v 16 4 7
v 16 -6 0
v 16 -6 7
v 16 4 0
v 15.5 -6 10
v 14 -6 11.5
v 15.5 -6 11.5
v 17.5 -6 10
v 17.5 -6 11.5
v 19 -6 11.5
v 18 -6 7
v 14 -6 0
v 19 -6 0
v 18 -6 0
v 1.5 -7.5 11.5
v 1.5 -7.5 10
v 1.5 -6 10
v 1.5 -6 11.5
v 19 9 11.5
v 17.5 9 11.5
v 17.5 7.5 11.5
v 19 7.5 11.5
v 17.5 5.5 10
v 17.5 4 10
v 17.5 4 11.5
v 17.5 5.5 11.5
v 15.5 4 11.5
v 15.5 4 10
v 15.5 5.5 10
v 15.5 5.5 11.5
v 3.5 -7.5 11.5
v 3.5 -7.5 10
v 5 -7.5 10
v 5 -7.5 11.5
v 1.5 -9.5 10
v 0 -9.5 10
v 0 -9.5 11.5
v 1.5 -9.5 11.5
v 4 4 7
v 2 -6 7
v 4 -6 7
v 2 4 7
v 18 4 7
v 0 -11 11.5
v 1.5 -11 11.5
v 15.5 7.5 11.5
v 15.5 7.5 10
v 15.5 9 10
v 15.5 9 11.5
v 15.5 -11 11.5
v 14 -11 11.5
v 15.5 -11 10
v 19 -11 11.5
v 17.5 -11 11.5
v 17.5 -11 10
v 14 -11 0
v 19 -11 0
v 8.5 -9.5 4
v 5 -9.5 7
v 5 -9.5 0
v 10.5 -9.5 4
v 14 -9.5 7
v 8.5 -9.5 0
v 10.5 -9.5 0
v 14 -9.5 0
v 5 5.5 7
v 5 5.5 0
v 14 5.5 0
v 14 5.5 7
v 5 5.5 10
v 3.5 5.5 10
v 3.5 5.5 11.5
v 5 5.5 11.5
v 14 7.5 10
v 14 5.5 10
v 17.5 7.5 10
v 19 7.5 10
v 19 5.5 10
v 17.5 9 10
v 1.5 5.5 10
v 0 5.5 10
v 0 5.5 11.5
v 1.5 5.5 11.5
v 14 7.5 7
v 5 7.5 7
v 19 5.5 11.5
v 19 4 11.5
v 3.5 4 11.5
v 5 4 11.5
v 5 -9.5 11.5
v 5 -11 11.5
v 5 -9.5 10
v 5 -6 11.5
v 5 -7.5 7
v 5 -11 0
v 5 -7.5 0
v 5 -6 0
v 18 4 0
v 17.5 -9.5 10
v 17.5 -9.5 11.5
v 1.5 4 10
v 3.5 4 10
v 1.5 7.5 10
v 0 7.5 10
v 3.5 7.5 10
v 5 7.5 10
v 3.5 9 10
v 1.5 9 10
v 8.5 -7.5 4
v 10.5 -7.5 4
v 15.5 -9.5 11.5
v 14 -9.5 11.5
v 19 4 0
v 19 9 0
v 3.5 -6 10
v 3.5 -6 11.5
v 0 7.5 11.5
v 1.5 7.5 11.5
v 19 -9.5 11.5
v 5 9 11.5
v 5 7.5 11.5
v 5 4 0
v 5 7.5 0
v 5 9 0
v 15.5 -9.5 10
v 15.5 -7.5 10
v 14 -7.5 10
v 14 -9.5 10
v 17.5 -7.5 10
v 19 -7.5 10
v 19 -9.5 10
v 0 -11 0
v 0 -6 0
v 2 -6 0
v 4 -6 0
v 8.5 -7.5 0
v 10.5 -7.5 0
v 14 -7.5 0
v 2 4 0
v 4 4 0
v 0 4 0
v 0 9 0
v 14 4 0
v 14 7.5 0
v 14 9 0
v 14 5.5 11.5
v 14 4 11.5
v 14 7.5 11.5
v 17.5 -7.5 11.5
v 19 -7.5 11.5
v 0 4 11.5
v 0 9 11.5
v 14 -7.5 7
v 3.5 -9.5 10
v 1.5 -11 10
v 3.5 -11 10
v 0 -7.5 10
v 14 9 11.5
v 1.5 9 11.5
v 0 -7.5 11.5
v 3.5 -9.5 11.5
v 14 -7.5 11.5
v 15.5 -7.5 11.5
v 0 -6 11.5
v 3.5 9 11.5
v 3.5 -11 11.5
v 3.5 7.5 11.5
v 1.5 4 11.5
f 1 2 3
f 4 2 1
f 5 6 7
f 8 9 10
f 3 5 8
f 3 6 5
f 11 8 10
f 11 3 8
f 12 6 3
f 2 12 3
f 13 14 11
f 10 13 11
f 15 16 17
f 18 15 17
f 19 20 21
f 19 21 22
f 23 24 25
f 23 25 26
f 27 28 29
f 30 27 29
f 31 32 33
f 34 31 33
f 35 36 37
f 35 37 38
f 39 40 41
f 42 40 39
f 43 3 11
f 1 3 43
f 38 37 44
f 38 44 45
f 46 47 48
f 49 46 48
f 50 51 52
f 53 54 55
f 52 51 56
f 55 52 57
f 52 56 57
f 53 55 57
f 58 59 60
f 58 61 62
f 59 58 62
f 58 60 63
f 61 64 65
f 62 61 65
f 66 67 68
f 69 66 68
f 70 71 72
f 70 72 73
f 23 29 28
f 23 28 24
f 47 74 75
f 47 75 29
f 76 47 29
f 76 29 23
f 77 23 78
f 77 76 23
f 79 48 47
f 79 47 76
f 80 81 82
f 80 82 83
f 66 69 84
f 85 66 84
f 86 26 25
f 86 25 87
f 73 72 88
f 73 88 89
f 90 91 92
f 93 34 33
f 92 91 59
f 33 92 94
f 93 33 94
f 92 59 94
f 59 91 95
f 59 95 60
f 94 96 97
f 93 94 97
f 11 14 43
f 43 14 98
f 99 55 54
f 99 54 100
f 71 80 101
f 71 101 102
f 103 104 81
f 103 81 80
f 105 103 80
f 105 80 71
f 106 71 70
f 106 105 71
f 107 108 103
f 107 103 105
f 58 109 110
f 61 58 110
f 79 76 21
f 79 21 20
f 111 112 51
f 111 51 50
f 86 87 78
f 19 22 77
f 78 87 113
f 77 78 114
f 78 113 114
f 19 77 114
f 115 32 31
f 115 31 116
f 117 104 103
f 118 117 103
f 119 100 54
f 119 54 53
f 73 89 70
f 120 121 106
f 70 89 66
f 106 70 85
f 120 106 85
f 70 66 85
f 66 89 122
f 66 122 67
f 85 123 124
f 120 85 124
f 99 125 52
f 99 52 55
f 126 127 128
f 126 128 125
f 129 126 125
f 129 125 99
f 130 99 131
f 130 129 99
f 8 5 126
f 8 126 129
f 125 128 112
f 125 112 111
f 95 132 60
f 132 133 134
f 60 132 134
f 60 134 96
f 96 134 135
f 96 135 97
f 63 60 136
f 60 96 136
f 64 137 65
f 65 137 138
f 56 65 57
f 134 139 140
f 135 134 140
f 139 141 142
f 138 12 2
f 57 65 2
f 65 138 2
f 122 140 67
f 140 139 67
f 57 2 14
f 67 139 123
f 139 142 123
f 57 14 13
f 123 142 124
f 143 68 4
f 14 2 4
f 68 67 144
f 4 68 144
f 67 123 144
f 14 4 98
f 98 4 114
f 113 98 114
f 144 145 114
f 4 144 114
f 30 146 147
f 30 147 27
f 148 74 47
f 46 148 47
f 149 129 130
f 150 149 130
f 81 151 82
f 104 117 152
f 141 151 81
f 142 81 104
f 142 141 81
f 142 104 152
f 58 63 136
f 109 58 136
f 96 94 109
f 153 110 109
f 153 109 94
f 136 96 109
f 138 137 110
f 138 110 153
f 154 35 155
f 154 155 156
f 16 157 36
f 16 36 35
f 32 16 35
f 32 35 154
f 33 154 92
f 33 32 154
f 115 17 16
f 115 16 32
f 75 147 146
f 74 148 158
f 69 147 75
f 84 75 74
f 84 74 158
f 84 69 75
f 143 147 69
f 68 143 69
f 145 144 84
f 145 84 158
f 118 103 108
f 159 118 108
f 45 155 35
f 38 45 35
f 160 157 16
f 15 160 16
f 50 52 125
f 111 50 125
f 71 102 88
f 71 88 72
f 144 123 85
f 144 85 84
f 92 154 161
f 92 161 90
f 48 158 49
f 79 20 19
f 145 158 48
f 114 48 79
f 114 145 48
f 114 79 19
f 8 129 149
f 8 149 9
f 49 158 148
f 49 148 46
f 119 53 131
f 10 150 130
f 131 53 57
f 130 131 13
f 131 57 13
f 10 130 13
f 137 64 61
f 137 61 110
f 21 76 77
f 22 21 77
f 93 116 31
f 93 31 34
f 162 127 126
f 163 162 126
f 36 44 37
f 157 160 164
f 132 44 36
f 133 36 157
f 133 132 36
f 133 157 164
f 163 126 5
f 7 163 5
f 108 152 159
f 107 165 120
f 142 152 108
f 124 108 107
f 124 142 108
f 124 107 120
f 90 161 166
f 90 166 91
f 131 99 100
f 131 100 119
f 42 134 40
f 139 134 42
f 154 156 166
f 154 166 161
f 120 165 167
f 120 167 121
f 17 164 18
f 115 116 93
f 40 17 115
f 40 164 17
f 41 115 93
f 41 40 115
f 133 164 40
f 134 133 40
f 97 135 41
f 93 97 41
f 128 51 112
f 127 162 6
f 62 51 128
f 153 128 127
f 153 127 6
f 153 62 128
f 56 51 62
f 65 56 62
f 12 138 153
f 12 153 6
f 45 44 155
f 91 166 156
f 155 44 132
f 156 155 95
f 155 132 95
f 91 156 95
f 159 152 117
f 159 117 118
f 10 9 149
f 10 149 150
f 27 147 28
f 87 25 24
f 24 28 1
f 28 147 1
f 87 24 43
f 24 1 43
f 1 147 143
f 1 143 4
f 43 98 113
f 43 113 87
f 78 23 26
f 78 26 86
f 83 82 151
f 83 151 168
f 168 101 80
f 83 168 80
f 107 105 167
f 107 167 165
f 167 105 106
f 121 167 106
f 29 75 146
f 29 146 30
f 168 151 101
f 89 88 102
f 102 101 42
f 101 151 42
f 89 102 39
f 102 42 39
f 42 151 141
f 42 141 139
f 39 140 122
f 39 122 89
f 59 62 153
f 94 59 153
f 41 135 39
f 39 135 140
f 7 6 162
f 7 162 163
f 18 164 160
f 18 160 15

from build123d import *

# Parameters (mm, degrees)
BOX021_W     = 19
BOX021_H     = 2
BOX021_DEPTH = 7
BOX020_W     = 19
BOX020_H     = 2
BOX020_DEPTH = 7
BOX018_W     = 1.5
BOX018_H     = 1.5
BOX018_DEPTH = 11.5
BOX016_W     = 1.5
BOX016_H     = 1.5
BOX016_DEPTH = 11.5
BOX017_W     = 1.5
BOX017_H     = 1.5
BOX017_DEPTH = 11.5
BOX019_W     = 1.5
BOX019_H     = 1.5
BOX019_DEPTH = 11.5
BOX015_W     = 5
BOX015_H     = 5
BOX015_DEPTH = 10
BOX013_W     = 1.5
BOX013_H     = 1.5
BOX013_DEPTH = 11.5
BOX011_W     = 1.5
BOX011_H     = 1.5
BOX011_DEPTH = 11.5
BOX012_W     = 1.5
BOX012_H     = 1.5
BOX012_DEPTH = 11.5
BOX014_W     = 1.5
BOX014_H     = 1.5
BOX014_DEPTH = 11.5
BOX010_W     = 5
BOX010_H     = 5
BOX010_DEPTH = 10
BOX023_W     = 19
BOX023_H     = 2
BOX023_DEPTH = 7
BOX003_W     = 1.5
BOX003_H     = 1.5
BOX003_DEPTH = 11.5
BOX001_W     = 1.5
BOX001_H     = 1.5
BOX001_DEPTH = 11.5
BOX002_W     = 1.5
BOX002_H     = 1.5
BOX002_DEPTH = 11.5
BOX004_W     = 1.5
BOX004_H     = 1.5
BOX004_DEPTH = 11.5
BOX_W        = 5
BOX_H        = 5
BOX_DEPTH    = 10
BOX008_W     = 1.5
BOX008_H     = 1.5
BOX008_DEPTH = 11.5
BOX006_W     = 1.5
BOX006_H     = 1.5
BOX006_DEPTH = 11.5
BOX007_W     = 1.5
BOX007_H     = 1.5
BOX007_DEPTH = 11.5
BOX009_W     = 1.5
BOX009_H     = 1.5
BOX009_DEPTH = 11.5
BOX005_W     = 5
BOX005_H     = 5
BOX005_DEPTH = 10
BOX024_W     = 2
BOX024_H     = 3
BOX024_DEPTH = 4
BOX022_W     = 19
BOX022_H     = 2
BOX022_DEPTH = 7


with BuildPart() as cubo021:
    # Box021 → Box021 (new body)
    with BuildSketch(Plane(origin=(0, 5.5, 0), x_dir=(1, 0, 0), z_dir=(0, 0, 1))):
        with Locations((9.5, 1)):
            Rectangle(BOX021_W, BOX021_H)
    extrude(amount=BOX021_DEPTH)


with BuildPart() as cubo020:
    # Box020 → Box020 (new body)
    with BuildSketch(Plane(origin=(18, -10.5, 0), x_dir=(0, 1, 0), z_dir=(0, 0, 1))):
        with Locations((9.5, 1)):
            Rectangle(BOX020_W, BOX020_H)
    extrude(amount=BOX020_DEPTH)


with BuildPart() as cubo018:
    # Box018 → Box018 (new body)
    with BuildSketch(Plane(origin=(3.5, 3.5, 0), x_dir=(1, 0, 0), z_dir=(0, 0, 1))):
        with Locations((0.75, 0.75)):
            Rectangle(BOX018_W, BOX018_H)
    extrude(amount=BOX018_DEPTH)


with BuildPart() as cubo016:
    # Box016 → Box016 (new body)
    with BuildSketch(Plane(origin=(0, 3.5, 0), x_dir=(1, 0, 0), z_dir=(0, 0, 1))):
        with Locations((0.75, 0.75)):
            Rectangle(BOX016_W, BOX016_H)
    extrude(amount=BOX016_DEPTH)


with BuildPart() as cubo017:
    # Box017 → Box017 (new body)
    with BuildSketch(Plane(origin=(3.5, 0, 0), x_dir=(1, 0, 0), z_dir=(0, 0, 1))):
        with Locations((0.75, 0.75)):
            Rectangle(BOX017_W, BOX017_H)
    extrude(amount=BOX017_DEPTH)


with BuildPart() as cubo019:
    # Box019 → Box019 (new body)
    with BuildSketch(Plane.XY):
        with Locations((0.75, 0.75)):
            Rectangle(BOX019_W, BOX019_H)
    extrude(amount=BOX019_DEPTH)


with BuildPart() as fusion015:
    # Box015 → Box015 (new body)
    with BuildSketch(Plane.XY):
        with Locations((2.5, 2.5)):
            Rectangle(BOX015_W, BOX015_H)
    extrude(amount=BOX015_DEPTH)

    # Fusion012: union Cubo019
    add(cubo019.part)

    # Fusion013: union Cubo017
    add(cubo017.part)

    # Fusion014: union Cubo016
    add(cubo016.part)

    # Fusion015: union Cubo018
    add(cubo018.part)


with BuildPart() as fusion015_1:
    # Fusion015 placement: moved
    add(fusion015.part.moved(Location((14, 4, 0))))


with BuildPart() as cubo013:
    # Box013 → Box013 (new body)
    with BuildSketch(Plane(origin=(3.5, 3.5, 0), x_dir=(1, 0, 0), z_dir=(0, 0, 1))):
        with Locations((0.75, 0.75)):
            Rectangle(BOX013_W, BOX013_H)
    extrude(amount=BOX013_DEPTH)


with BuildPart() as cubo011:
    # Box011 → Box011 (new body)
    with BuildSketch(Plane(origin=(0, 3.5, 0), x_dir=(1, 0, 0), z_dir=(0, 0, 1))):
        with Locations((0.75, 0.75)):
            Rectangle(BOX011_W, BOX011_H)
    extrude(amount=BOX011_DEPTH)


with BuildPart() as cubo012:
    # Box012 → Box012 (new body)
    with BuildSketch(Plane(origin=(3.5, 0, 0), x_dir=(1, 0, 0), z_dir=(0, 0, 1))):
        with Locations((0.75, 0.75)):
            Rectangle(BOX012_W, BOX012_H)
    extrude(amount=BOX012_DEPTH)


with BuildPart() as cubo014:
    # Box014 → Box014 (new body)
    with BuildSketch(Plane.XY):
        with Locations((0.75, 0.75)):
            Rectangle(BOX014_W, BOX014_H)
    extrude(amount=BOX014_DEPTH)


with BuildPart() as fusion011:
    # Box010 → Box010 (new body)
    with BuildSketch(Plane.XY):
        with Locations((2.5, 2.5)):
            Rectangle(BOX010_W, BOX010_H)
    extrude(amount=BOX010_DEPTH)

    # Fusion008: union Cubo014
    add(cubo014.part)

    # Fusion009: union Cubo012
    add(cubo012.part)

    # Fusion010: union Cubo011
    add(cubo011.part)

    # Fusion011: union Cubo013
    add(cubo013.part)


with BuildPart() as fusion011_1:
    # Fusion011 placement: moved
    add(fusion011.part.moved(Location((14, -11, 0))))


with BuildPart() as cubo023:
    # Box023 → Box023 (new body)
    with BuildSketch(Plane(origin=(4, -10.5, 0), x_dir=(0, 1, 0), z_dir=(0, 0, 1))):
        with Locations((9.5, 1)):
            Rectangle(BOX023_W, BOX023_H)
    extrude(amount=BOX023_DEPTH)


with BuildPart() as cubo003:
    # Box003 → Box003 (new body)
    with BuildSketch(Plane(origin=(3.5, 3.5, 0), x_dir=(1, 0, 0), z_dir=(0, 0, 1))):
        with Locations((0.75, 0.75)):
            Rectangle(BOX003_W, BOX003_H)
    extrude(amount=BOX003_DEPTH)


with BuildPart() as cubo001:
    # Box001 → Box001 (new body)
    with BuildSketch(Plane(origin=(0, 3.5, 0), x_dir=(1, 0, 0), z_dir=(0, 0, 1))):
        with Locations((0.75, 0.75)):
            Rectangle(BOX001_W, BOX001_H)
    extrude(amount=BOX001_DEPTH)


with BuildPart() as cubo002:
    # Box002 → Box002 (new body)
    with BuildSketch(Plane(origin=(3.5, 0, 0), x_dir=(1, 0, 0), z_dir=(0, 0, 1))):
        with Locations((0.75, 0.75)):
            Rectangle(BOX002_W, BOX002_H)
    extrude(amount=BOX002_DEPTH)


with BuildPart() as cubo004:
    # Box004 → Box004 (new body)
    with BuildSketch(Plane.XY):
        with Locations((0.75, 0.75)):
            Rectangle(BOX004_W, BOX004_H)
    extrude(amount=BOX004_DEPTH)


with BuildPart() as fusion003:
    # Box → Box (new body)
    with BuildSketch(Plane.XY):
        with Locations((2.5, 2.5)):
            Rectangle(BOX_W, BOX_H)
    extrude(amount=BOX_DEPTH)

    # Fusion: union Cubo004
    add(cubo004.part)

    # Fusion001: union Cubo002
    add(cubo002.part)

    # Fusion002: union Cubo001
    add(cubo001.part)

    # Fusion003: union Cubo003
    add(cubo003.part)


with BuildPart() as fusion003_1:
    # Fusion003 placement: moved
    add(fusion003.part.moved(Location((0, 4, 0))))


with BuildPart() as cubo008:
    # Box008 → Box008 (new body)
    with BuildSketch(Plane(origin=(3.5, 3.5, 0), x_dir=(1, 0, 0), z_dir=(0, 0, 1))):
        with Locations((0.75, 0.75)):
            Rectangle(BOX008_W, BOX008_H)
    extrude(amount=BOX008_DEPTH)


with BuildPart() as cubo006:
    # Box006 → Box006 (new body)
    with BuildSketch(Plane(origin=(0, 3.5, 0), x_dir=(1, 0, 0), z_dir=(0, 0, 1))):
        with Locations((0.75, 0.75)):
            Rectangle(BOX006_W, BOX006_H)
    extrude(amount=BOX006_DEPTH)


with BuildPart() as cubo007:
    # Box007 → Box007 (new body)
    with BuildSketch(Plane(origin=(3.5, 0, 0), x_dir=(1, 0, 0), z_dir=(0, 0, 1))):
        with Locations((0.75, 0.75)):
            Rectangle(BOX007_W, BOX007_H)
    extrude(amount=BOX007_DEPTH)


with BuildPart() as cubo009:
    # Box009 → Box009 (new body)
    with BuildSketch(Plane.XY):
        with Locations((0.75, 0.75)):
            Rectangle(BOX009_W, BOX009_H)
    extrude(amount=BOX009_DEPTH)


with BuildPart() as fusion007:
    # Box005 → Box005 (new body)
    with BuildSketch(Plane.XY):
        with Locations((2.5, 2.5)):
            Rectangle(BOX005_W, BOX005_H)
    extrude(amount=BOX005_DEPTH)

    # Fusion004: union Cubo009
    add(cubo009.part)

    # Fusion005: union Cubo007
    add(cubo007.part)

    # Fusion006: union Cubo006
    add(cubo006.part)

    # Fusion007: union Cubo008
    add(cubo008.part)


with BuildPart() as fusion007_1:
    # Fusion007 placement: moved
    add(fusion007.part.moved(Location((0, -11, 0))))


with BuildPart() as cubo024:
    # Box024 → Box024 (new body)
    with BuildSketch(Plane(origin=(8.5, -10, 0), x_dir=(1, 0, 0), z_dir=(0, 0, 1))):
        with Locations((1, 1.5)):
            Rectangle(BOX024_W, BOX024_H)
    extrude(amount=BOX024_DEPTH)


with BuildPart() as fusion016:
    # Box022 → Box022 (new body)
    with BuildSketch(Plane(origin=(0, -9.5, 0), x_dir=(1, 0, 0), z_dir=(0, 0, 1))):
        with Locations((9.5, 1)):
            Rectangle(BOX022_W, BOX022_H)
    extrude(amount=BOX022_DEPTH)

    # Cut: cut Cubo024
    add(cubo024.part, mode=Mode.SUBTRACT)

    # Fusion016: union Cubo021, Cubo020, Fusion015, Fusion011, Cubo023, Fusion003, Fusion007
    add(cubo021.part)
    add(cubo020.part)
    add(fusion015_1.part)
    add(fusion011_1.part)
    add(cubo023.part)
    add(fusion003_1.part)
    add(fusion007_1.part)


solid = fusion016.part
